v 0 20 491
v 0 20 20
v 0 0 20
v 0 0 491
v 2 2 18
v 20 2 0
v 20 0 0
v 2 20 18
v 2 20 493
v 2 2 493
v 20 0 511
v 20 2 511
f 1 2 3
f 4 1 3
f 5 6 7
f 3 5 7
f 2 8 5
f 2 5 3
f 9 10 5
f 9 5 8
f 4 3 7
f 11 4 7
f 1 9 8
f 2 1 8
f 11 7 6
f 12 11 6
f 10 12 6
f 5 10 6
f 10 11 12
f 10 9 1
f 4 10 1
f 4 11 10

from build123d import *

# Parameters (mm, degrees)
BOSS_EXTRUDE1_DEPTH = 511
CUT_EXTRUDE1_DEPTH  = 23


with BuildPart() as part:
    # Sketch1 → Boss-Extrude1 (new body)
    with BuildSketch(Plane.XY):
        Polygon((0, 0), (20, 0), (20, 2), (2, 2), (2, 20), (0, 20), align=None)
    extrude(amount=BOSS_EXTRUDE1_DEPTH)

    # Sketch2 → Cut-Extrude1 (cut, symmetric)
    with BuildSketch(Plane(origin=(0, 2, 0), x_dir=(1, 0, 0), z_dir=(0, 1, 0))):
        Polygon((0, -511), (20, -511), (0, -491), align=None)
        Polygon((20, 0), (0, -20), (0, 0), align=None)
    extrude(amount=CUT_EXTRUDE1_DEPTH, both=True, mode=Mode.SUBTRACT)


solid = part.part
